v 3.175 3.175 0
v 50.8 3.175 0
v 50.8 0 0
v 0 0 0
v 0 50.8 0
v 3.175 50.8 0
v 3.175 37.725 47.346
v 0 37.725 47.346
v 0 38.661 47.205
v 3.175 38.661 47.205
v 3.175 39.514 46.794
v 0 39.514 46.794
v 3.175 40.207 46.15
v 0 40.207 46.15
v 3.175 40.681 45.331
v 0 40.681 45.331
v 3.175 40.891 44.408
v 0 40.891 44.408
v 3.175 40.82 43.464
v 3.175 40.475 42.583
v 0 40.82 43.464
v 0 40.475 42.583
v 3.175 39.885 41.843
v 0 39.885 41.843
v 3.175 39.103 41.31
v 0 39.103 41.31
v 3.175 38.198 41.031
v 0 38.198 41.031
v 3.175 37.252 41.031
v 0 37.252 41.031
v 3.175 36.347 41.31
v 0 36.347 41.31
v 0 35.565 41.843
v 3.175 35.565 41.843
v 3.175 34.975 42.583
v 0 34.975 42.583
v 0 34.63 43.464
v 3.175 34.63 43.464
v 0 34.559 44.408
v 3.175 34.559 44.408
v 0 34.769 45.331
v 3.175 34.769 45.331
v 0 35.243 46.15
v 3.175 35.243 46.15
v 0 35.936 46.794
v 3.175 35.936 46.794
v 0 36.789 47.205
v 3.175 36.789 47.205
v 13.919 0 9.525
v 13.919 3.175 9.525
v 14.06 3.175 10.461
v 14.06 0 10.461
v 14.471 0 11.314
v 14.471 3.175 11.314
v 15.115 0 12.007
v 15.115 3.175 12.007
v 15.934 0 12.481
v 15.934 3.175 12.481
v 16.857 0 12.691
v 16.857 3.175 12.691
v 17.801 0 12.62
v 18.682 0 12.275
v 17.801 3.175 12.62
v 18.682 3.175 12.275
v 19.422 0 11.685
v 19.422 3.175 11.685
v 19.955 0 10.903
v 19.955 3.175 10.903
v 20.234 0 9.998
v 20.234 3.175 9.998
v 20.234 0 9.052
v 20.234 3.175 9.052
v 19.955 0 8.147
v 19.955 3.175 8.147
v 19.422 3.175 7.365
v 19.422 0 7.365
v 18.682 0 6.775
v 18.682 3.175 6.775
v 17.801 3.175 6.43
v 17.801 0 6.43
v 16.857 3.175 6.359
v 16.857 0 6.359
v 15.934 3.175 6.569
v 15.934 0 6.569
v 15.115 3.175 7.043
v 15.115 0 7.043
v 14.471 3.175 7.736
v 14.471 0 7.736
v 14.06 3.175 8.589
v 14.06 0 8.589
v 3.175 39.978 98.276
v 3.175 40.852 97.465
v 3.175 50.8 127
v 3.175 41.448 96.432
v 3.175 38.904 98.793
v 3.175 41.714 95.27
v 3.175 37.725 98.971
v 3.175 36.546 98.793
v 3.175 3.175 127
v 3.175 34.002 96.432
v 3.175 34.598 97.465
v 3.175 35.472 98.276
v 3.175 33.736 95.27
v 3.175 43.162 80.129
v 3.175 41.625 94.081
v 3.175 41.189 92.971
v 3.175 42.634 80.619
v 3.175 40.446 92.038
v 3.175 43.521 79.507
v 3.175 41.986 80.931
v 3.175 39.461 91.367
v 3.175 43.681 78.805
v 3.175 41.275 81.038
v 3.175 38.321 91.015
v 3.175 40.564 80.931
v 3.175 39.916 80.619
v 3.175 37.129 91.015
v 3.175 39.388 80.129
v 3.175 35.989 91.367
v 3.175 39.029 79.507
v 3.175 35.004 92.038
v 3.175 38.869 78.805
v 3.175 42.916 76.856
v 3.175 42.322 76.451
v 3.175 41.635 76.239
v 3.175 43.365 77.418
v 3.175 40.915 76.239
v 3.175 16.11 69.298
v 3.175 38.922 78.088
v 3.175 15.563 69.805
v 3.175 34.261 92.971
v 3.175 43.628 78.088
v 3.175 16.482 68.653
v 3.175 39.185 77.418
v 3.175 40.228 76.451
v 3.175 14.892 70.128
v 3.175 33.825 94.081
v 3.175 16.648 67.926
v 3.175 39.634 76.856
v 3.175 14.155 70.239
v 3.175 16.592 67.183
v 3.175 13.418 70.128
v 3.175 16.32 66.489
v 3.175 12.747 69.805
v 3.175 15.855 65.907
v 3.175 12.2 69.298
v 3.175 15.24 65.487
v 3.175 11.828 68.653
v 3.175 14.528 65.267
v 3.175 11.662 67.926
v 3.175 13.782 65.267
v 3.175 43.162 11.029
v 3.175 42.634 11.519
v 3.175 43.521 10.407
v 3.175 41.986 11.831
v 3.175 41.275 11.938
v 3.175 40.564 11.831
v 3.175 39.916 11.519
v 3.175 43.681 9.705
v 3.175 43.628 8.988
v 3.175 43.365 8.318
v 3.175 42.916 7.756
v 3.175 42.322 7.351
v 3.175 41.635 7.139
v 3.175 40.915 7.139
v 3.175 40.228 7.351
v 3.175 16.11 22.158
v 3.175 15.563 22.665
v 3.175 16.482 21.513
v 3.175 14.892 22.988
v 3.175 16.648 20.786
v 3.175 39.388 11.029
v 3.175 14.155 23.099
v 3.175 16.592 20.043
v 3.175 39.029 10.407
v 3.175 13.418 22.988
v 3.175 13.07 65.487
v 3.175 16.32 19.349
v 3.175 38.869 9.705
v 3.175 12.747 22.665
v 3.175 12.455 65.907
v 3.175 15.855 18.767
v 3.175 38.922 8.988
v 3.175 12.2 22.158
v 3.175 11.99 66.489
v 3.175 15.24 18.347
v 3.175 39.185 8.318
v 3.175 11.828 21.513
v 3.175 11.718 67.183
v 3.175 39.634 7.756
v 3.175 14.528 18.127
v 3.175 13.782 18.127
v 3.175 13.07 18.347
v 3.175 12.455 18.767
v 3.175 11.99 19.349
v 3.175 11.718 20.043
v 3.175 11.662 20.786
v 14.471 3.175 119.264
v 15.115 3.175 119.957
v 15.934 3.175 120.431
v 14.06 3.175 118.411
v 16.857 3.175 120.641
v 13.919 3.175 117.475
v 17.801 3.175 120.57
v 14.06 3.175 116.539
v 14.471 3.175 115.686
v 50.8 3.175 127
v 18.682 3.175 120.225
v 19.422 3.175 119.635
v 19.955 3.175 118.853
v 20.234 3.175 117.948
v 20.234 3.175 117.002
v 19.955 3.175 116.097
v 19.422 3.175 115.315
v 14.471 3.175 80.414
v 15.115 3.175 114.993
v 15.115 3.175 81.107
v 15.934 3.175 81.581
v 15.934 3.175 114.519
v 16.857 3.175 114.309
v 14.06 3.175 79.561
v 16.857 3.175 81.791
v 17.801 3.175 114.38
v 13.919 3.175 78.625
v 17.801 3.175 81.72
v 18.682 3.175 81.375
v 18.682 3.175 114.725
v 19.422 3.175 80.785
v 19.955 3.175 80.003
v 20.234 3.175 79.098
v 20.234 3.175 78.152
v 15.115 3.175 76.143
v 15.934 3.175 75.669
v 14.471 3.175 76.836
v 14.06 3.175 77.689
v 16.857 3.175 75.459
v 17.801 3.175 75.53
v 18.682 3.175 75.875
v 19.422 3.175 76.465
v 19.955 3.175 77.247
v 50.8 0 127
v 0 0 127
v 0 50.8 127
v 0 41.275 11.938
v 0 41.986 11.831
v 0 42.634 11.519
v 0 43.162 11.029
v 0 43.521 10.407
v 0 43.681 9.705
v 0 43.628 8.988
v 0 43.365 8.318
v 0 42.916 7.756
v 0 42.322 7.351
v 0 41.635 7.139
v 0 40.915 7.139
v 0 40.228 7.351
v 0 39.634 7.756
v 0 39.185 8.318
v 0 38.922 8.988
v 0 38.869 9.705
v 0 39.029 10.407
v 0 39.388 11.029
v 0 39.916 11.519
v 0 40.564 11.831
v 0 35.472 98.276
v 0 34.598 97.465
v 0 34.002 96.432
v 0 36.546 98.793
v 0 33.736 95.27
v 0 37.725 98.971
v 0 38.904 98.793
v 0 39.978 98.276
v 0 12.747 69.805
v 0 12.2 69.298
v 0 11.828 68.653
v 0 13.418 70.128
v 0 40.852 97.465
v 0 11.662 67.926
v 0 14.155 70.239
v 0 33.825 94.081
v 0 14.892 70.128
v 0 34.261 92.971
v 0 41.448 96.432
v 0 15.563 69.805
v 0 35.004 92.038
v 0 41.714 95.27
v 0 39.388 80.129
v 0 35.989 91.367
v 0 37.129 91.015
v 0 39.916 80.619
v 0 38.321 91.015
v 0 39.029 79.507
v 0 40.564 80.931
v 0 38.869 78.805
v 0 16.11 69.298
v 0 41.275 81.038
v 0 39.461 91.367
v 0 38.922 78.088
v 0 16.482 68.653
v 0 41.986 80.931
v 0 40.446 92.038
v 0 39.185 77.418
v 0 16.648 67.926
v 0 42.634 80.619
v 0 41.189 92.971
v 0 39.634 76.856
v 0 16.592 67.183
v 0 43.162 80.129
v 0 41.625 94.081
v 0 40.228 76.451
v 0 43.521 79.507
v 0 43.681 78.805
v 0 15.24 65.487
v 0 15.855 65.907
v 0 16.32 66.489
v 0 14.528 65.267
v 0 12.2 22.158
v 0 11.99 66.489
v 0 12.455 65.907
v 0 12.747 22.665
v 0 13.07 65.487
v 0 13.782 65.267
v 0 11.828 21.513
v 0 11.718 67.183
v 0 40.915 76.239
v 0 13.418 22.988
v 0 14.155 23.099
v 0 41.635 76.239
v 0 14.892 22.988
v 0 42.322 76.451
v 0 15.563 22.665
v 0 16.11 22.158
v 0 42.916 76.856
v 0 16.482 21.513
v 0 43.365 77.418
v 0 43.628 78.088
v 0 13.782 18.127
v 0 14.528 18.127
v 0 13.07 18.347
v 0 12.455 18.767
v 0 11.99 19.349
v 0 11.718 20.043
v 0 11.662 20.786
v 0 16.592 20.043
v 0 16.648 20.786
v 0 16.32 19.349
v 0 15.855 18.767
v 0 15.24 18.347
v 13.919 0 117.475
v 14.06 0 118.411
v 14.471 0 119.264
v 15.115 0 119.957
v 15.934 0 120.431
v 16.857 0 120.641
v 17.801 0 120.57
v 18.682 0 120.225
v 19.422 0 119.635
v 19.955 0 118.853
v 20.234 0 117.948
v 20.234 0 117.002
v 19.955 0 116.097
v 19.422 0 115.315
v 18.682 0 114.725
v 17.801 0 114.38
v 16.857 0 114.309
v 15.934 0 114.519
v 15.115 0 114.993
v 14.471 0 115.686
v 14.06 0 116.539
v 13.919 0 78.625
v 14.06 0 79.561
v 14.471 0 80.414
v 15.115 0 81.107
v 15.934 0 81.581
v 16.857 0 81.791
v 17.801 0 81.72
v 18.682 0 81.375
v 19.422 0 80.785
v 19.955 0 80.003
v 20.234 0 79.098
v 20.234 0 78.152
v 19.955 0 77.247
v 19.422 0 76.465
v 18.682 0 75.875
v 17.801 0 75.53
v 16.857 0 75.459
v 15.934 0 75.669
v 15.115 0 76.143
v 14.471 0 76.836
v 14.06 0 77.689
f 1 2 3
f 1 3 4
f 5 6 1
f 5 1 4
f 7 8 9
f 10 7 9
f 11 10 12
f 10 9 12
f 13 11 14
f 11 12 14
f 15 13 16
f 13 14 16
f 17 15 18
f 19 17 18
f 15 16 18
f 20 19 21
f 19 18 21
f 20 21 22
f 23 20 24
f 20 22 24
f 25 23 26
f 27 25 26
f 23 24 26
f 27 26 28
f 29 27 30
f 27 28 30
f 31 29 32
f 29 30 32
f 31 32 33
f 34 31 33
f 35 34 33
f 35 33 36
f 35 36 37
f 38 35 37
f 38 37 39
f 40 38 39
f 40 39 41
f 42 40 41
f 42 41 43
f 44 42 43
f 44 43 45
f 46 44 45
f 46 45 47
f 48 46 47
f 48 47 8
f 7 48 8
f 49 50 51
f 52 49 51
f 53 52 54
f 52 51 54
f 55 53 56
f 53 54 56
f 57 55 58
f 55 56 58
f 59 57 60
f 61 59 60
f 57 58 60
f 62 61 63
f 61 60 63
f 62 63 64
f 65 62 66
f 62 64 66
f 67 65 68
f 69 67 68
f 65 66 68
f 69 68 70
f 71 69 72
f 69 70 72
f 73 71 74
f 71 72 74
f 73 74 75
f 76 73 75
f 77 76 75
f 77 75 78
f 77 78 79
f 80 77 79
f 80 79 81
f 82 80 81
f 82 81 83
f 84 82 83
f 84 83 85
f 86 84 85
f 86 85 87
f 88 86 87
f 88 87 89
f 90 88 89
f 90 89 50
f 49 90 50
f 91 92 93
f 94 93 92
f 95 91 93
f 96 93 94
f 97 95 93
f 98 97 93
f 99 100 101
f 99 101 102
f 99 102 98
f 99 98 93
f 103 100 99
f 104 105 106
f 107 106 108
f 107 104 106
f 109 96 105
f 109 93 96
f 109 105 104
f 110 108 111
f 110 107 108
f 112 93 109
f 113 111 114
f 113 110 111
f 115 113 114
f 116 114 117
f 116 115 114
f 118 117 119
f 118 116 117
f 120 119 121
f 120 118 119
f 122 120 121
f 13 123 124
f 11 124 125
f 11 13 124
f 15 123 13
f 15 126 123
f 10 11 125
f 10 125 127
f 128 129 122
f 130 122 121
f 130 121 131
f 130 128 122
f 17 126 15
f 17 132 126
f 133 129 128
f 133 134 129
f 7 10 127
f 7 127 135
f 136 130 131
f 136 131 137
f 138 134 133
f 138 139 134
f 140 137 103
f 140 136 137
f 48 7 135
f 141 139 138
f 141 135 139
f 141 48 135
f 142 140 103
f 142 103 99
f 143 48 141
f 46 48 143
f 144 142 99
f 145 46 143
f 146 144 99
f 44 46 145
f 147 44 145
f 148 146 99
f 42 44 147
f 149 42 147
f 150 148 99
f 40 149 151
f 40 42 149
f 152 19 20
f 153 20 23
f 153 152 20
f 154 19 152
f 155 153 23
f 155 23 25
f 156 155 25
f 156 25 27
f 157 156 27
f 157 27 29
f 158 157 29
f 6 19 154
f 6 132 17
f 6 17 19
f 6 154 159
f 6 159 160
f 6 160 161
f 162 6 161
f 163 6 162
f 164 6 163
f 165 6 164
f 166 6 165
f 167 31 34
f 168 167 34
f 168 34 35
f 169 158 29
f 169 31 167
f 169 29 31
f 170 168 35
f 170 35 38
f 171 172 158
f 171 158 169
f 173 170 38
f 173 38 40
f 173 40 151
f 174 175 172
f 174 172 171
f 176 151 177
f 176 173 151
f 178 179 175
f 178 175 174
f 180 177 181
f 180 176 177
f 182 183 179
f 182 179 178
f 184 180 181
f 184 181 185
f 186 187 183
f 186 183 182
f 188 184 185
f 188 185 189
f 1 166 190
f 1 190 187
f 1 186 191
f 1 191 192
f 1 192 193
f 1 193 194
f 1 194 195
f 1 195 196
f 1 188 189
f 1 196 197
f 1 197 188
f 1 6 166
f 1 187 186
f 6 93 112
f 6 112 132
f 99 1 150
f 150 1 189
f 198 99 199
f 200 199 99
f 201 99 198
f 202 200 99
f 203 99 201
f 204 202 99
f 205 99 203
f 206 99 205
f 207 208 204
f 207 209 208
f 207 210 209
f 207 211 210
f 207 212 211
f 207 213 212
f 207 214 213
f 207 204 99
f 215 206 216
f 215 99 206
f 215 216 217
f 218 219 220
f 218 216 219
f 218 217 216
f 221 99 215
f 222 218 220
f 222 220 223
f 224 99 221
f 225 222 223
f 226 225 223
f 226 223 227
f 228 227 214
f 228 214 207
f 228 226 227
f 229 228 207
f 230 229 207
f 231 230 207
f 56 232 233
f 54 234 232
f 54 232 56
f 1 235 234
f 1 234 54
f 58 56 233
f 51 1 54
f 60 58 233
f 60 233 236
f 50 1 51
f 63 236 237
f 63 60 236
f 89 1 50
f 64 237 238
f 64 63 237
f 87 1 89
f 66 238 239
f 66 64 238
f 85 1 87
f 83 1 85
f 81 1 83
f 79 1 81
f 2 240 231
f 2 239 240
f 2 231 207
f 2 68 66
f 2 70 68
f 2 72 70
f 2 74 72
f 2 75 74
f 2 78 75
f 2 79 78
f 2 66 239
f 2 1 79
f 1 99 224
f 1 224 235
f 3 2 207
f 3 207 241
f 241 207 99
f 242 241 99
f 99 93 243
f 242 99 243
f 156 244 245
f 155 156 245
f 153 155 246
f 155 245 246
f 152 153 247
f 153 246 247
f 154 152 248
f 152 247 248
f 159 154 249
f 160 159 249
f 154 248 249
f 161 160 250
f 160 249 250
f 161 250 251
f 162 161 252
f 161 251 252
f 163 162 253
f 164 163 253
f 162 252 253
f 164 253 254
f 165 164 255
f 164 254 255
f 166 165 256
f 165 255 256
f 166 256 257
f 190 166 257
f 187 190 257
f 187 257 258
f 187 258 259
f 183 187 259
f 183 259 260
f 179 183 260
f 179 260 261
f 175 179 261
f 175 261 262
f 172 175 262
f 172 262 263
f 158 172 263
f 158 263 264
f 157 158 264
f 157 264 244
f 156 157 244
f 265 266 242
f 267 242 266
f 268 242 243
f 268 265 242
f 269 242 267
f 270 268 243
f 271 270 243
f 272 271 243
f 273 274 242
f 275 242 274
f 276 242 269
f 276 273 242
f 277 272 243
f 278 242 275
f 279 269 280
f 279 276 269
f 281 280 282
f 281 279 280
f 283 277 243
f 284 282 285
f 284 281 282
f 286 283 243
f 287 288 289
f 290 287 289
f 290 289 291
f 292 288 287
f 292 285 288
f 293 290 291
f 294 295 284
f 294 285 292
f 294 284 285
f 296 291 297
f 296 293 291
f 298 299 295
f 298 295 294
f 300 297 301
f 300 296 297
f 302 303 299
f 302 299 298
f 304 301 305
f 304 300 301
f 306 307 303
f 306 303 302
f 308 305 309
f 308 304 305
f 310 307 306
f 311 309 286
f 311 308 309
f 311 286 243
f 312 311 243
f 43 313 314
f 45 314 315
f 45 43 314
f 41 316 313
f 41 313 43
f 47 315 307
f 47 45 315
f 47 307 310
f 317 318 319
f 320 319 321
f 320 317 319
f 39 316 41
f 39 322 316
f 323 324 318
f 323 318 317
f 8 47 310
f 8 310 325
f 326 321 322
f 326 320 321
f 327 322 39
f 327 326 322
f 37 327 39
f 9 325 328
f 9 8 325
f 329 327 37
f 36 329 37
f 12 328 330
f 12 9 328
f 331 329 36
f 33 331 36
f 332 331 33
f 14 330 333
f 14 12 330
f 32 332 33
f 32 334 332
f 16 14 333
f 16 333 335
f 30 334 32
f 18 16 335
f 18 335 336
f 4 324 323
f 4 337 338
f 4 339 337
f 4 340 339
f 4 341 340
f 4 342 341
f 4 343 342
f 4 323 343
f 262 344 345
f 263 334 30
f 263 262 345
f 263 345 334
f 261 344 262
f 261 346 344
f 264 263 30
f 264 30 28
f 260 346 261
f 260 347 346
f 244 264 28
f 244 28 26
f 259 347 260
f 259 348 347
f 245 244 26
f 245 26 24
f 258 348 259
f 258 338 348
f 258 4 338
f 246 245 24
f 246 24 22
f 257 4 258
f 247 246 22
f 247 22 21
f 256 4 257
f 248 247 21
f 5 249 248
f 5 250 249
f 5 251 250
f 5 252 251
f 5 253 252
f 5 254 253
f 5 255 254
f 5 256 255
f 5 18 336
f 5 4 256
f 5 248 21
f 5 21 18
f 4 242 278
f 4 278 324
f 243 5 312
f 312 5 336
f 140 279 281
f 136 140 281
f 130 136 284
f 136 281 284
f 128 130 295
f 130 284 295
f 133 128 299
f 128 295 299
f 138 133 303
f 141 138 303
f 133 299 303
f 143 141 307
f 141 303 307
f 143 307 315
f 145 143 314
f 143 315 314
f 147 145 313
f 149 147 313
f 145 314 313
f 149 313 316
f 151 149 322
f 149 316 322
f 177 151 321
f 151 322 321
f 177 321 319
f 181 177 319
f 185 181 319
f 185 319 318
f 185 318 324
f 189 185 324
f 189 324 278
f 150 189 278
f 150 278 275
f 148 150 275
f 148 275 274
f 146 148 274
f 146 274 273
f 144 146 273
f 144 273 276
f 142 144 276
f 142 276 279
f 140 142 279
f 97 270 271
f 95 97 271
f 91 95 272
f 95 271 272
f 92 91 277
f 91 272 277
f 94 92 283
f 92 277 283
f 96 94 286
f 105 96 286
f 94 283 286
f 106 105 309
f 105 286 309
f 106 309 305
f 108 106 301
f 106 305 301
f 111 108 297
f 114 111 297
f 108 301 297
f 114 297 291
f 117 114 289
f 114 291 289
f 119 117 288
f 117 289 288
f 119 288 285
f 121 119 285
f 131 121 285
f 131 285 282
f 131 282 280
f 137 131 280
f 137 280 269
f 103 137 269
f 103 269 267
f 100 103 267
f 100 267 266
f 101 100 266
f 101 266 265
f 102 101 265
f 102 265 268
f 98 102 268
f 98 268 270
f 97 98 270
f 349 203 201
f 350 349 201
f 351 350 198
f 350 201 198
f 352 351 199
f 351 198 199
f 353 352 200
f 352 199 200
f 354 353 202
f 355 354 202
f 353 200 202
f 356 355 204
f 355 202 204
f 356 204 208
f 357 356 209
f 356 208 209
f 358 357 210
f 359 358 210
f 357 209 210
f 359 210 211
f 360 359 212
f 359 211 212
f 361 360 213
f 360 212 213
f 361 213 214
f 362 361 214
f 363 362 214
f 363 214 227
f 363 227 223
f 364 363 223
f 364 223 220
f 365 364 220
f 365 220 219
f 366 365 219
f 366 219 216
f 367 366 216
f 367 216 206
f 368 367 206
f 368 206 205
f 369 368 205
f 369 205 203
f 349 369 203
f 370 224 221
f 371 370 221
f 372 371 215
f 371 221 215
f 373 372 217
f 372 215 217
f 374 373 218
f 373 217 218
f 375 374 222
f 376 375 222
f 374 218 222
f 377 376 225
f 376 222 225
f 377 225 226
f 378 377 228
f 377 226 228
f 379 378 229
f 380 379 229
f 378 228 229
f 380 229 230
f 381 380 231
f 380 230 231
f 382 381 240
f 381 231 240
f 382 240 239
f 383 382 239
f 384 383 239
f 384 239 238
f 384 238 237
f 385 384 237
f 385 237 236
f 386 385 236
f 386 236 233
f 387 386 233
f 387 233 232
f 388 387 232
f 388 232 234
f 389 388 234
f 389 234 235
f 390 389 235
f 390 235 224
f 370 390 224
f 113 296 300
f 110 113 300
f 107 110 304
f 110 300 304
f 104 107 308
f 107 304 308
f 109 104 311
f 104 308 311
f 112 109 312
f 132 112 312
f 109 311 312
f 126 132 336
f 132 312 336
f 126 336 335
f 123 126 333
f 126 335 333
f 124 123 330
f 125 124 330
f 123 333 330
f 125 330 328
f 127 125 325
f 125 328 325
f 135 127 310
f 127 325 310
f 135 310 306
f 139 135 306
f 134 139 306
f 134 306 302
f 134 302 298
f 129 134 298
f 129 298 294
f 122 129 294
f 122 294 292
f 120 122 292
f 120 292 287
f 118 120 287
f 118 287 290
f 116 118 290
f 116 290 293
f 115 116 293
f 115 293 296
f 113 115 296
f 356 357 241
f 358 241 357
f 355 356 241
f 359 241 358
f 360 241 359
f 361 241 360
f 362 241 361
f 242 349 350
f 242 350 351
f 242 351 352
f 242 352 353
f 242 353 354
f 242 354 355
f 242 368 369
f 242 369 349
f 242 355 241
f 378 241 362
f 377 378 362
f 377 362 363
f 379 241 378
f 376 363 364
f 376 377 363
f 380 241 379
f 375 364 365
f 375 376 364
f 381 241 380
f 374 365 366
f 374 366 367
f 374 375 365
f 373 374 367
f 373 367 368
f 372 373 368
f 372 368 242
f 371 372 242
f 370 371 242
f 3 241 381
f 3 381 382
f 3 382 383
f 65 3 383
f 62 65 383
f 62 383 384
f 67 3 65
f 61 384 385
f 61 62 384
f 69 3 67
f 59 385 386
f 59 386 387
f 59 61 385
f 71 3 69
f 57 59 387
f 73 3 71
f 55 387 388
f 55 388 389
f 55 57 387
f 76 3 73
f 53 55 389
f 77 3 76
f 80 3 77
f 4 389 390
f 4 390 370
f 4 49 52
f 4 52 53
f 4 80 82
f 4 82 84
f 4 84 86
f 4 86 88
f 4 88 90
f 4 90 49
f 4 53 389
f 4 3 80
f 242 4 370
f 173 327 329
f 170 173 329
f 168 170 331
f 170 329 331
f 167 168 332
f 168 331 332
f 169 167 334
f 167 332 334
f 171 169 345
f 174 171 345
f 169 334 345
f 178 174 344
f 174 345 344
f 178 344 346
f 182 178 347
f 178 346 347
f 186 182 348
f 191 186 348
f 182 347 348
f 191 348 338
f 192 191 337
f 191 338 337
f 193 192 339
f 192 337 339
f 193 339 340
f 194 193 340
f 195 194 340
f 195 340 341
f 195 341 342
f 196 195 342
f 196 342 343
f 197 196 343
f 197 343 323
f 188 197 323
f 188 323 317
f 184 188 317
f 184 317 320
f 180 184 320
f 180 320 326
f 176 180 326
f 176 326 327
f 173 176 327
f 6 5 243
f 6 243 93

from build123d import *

# Parameters (mm, degrees)
BOSS_EXTRUDE1_DEPTH = 127
SKETCH3_R           = 3.175
CUT_EXTRUDE1_DEPTH  = 145.837083045
SKETCH4_R           = 2.5
SKETCH4_R_2         = 2.413
SKETCH4_R_3         = 3.175
SKETCH4_R_4         = 4
CUT_EXTRUDE2_DEPTH  = 146.911891222


with BuildPart() as part:
    # Sketch2 → Boss-Extrude1 (new body)
    with BuildSketch(Plane.XY):
        Polygon((0, 0), (0, 50.8), (3.175, 50.8), (3.175, 3.175), (50.8, 3.175), (50.8, 0), align=None)
    extrude(amount=BOSS_EXTRUDE1_DEPTH)

    # Sketch3 → Cut-Extrude1 (cut, through all)
    with BuildSketch(Plane(origin=(0, 3.175, 0), x_dir=(1, 0, 0), z_dir=(0, 1, 0))):
        with Locations(Location((17.0942, -9.525, 0), (0, 0, 180))):
            Circle(SKETCH3_R)
        with Locations(Location((17.0942, -78.624999976, 0), (0, 0, 180))):
            Circle(SKETCH3_R)
        with Locations(Location((17.0942, -117.475, 0), (0, 0, 180))):
            Circle(SKETCH3_R)
    extrude(amount=-CUT_EXTRUDE1_DEPTH, mode=Mode.SUBTRACT)

    # Sketch4 → Cut-Extrude2 (cut, through all)
    with BuildSketch(Plane.ZY):
        with Locations((20.5994, 14.155)):
            Circle(SKETCH4_R)
        with Locations((9.525, 41.275)):
            Circle(SKETCH4_R_2)
        with Locations((67.7394, 14.155)):
            Circle(SKETCH4_R)
        with Locations((78.625, 41.275)):
            Circle(SKETCH4_R_2)
        with Locations((44.1706, 37.725)):
            Circle(SKETCH4_R_3)
        with Locations((94.9706, 37.725)):
            Circle(SKETCH4_R_4)
    extrude(amount=-CUT_EXTRUDE2_DEPTH, mode=Mode.SUBTRACT)


solid = part.part
